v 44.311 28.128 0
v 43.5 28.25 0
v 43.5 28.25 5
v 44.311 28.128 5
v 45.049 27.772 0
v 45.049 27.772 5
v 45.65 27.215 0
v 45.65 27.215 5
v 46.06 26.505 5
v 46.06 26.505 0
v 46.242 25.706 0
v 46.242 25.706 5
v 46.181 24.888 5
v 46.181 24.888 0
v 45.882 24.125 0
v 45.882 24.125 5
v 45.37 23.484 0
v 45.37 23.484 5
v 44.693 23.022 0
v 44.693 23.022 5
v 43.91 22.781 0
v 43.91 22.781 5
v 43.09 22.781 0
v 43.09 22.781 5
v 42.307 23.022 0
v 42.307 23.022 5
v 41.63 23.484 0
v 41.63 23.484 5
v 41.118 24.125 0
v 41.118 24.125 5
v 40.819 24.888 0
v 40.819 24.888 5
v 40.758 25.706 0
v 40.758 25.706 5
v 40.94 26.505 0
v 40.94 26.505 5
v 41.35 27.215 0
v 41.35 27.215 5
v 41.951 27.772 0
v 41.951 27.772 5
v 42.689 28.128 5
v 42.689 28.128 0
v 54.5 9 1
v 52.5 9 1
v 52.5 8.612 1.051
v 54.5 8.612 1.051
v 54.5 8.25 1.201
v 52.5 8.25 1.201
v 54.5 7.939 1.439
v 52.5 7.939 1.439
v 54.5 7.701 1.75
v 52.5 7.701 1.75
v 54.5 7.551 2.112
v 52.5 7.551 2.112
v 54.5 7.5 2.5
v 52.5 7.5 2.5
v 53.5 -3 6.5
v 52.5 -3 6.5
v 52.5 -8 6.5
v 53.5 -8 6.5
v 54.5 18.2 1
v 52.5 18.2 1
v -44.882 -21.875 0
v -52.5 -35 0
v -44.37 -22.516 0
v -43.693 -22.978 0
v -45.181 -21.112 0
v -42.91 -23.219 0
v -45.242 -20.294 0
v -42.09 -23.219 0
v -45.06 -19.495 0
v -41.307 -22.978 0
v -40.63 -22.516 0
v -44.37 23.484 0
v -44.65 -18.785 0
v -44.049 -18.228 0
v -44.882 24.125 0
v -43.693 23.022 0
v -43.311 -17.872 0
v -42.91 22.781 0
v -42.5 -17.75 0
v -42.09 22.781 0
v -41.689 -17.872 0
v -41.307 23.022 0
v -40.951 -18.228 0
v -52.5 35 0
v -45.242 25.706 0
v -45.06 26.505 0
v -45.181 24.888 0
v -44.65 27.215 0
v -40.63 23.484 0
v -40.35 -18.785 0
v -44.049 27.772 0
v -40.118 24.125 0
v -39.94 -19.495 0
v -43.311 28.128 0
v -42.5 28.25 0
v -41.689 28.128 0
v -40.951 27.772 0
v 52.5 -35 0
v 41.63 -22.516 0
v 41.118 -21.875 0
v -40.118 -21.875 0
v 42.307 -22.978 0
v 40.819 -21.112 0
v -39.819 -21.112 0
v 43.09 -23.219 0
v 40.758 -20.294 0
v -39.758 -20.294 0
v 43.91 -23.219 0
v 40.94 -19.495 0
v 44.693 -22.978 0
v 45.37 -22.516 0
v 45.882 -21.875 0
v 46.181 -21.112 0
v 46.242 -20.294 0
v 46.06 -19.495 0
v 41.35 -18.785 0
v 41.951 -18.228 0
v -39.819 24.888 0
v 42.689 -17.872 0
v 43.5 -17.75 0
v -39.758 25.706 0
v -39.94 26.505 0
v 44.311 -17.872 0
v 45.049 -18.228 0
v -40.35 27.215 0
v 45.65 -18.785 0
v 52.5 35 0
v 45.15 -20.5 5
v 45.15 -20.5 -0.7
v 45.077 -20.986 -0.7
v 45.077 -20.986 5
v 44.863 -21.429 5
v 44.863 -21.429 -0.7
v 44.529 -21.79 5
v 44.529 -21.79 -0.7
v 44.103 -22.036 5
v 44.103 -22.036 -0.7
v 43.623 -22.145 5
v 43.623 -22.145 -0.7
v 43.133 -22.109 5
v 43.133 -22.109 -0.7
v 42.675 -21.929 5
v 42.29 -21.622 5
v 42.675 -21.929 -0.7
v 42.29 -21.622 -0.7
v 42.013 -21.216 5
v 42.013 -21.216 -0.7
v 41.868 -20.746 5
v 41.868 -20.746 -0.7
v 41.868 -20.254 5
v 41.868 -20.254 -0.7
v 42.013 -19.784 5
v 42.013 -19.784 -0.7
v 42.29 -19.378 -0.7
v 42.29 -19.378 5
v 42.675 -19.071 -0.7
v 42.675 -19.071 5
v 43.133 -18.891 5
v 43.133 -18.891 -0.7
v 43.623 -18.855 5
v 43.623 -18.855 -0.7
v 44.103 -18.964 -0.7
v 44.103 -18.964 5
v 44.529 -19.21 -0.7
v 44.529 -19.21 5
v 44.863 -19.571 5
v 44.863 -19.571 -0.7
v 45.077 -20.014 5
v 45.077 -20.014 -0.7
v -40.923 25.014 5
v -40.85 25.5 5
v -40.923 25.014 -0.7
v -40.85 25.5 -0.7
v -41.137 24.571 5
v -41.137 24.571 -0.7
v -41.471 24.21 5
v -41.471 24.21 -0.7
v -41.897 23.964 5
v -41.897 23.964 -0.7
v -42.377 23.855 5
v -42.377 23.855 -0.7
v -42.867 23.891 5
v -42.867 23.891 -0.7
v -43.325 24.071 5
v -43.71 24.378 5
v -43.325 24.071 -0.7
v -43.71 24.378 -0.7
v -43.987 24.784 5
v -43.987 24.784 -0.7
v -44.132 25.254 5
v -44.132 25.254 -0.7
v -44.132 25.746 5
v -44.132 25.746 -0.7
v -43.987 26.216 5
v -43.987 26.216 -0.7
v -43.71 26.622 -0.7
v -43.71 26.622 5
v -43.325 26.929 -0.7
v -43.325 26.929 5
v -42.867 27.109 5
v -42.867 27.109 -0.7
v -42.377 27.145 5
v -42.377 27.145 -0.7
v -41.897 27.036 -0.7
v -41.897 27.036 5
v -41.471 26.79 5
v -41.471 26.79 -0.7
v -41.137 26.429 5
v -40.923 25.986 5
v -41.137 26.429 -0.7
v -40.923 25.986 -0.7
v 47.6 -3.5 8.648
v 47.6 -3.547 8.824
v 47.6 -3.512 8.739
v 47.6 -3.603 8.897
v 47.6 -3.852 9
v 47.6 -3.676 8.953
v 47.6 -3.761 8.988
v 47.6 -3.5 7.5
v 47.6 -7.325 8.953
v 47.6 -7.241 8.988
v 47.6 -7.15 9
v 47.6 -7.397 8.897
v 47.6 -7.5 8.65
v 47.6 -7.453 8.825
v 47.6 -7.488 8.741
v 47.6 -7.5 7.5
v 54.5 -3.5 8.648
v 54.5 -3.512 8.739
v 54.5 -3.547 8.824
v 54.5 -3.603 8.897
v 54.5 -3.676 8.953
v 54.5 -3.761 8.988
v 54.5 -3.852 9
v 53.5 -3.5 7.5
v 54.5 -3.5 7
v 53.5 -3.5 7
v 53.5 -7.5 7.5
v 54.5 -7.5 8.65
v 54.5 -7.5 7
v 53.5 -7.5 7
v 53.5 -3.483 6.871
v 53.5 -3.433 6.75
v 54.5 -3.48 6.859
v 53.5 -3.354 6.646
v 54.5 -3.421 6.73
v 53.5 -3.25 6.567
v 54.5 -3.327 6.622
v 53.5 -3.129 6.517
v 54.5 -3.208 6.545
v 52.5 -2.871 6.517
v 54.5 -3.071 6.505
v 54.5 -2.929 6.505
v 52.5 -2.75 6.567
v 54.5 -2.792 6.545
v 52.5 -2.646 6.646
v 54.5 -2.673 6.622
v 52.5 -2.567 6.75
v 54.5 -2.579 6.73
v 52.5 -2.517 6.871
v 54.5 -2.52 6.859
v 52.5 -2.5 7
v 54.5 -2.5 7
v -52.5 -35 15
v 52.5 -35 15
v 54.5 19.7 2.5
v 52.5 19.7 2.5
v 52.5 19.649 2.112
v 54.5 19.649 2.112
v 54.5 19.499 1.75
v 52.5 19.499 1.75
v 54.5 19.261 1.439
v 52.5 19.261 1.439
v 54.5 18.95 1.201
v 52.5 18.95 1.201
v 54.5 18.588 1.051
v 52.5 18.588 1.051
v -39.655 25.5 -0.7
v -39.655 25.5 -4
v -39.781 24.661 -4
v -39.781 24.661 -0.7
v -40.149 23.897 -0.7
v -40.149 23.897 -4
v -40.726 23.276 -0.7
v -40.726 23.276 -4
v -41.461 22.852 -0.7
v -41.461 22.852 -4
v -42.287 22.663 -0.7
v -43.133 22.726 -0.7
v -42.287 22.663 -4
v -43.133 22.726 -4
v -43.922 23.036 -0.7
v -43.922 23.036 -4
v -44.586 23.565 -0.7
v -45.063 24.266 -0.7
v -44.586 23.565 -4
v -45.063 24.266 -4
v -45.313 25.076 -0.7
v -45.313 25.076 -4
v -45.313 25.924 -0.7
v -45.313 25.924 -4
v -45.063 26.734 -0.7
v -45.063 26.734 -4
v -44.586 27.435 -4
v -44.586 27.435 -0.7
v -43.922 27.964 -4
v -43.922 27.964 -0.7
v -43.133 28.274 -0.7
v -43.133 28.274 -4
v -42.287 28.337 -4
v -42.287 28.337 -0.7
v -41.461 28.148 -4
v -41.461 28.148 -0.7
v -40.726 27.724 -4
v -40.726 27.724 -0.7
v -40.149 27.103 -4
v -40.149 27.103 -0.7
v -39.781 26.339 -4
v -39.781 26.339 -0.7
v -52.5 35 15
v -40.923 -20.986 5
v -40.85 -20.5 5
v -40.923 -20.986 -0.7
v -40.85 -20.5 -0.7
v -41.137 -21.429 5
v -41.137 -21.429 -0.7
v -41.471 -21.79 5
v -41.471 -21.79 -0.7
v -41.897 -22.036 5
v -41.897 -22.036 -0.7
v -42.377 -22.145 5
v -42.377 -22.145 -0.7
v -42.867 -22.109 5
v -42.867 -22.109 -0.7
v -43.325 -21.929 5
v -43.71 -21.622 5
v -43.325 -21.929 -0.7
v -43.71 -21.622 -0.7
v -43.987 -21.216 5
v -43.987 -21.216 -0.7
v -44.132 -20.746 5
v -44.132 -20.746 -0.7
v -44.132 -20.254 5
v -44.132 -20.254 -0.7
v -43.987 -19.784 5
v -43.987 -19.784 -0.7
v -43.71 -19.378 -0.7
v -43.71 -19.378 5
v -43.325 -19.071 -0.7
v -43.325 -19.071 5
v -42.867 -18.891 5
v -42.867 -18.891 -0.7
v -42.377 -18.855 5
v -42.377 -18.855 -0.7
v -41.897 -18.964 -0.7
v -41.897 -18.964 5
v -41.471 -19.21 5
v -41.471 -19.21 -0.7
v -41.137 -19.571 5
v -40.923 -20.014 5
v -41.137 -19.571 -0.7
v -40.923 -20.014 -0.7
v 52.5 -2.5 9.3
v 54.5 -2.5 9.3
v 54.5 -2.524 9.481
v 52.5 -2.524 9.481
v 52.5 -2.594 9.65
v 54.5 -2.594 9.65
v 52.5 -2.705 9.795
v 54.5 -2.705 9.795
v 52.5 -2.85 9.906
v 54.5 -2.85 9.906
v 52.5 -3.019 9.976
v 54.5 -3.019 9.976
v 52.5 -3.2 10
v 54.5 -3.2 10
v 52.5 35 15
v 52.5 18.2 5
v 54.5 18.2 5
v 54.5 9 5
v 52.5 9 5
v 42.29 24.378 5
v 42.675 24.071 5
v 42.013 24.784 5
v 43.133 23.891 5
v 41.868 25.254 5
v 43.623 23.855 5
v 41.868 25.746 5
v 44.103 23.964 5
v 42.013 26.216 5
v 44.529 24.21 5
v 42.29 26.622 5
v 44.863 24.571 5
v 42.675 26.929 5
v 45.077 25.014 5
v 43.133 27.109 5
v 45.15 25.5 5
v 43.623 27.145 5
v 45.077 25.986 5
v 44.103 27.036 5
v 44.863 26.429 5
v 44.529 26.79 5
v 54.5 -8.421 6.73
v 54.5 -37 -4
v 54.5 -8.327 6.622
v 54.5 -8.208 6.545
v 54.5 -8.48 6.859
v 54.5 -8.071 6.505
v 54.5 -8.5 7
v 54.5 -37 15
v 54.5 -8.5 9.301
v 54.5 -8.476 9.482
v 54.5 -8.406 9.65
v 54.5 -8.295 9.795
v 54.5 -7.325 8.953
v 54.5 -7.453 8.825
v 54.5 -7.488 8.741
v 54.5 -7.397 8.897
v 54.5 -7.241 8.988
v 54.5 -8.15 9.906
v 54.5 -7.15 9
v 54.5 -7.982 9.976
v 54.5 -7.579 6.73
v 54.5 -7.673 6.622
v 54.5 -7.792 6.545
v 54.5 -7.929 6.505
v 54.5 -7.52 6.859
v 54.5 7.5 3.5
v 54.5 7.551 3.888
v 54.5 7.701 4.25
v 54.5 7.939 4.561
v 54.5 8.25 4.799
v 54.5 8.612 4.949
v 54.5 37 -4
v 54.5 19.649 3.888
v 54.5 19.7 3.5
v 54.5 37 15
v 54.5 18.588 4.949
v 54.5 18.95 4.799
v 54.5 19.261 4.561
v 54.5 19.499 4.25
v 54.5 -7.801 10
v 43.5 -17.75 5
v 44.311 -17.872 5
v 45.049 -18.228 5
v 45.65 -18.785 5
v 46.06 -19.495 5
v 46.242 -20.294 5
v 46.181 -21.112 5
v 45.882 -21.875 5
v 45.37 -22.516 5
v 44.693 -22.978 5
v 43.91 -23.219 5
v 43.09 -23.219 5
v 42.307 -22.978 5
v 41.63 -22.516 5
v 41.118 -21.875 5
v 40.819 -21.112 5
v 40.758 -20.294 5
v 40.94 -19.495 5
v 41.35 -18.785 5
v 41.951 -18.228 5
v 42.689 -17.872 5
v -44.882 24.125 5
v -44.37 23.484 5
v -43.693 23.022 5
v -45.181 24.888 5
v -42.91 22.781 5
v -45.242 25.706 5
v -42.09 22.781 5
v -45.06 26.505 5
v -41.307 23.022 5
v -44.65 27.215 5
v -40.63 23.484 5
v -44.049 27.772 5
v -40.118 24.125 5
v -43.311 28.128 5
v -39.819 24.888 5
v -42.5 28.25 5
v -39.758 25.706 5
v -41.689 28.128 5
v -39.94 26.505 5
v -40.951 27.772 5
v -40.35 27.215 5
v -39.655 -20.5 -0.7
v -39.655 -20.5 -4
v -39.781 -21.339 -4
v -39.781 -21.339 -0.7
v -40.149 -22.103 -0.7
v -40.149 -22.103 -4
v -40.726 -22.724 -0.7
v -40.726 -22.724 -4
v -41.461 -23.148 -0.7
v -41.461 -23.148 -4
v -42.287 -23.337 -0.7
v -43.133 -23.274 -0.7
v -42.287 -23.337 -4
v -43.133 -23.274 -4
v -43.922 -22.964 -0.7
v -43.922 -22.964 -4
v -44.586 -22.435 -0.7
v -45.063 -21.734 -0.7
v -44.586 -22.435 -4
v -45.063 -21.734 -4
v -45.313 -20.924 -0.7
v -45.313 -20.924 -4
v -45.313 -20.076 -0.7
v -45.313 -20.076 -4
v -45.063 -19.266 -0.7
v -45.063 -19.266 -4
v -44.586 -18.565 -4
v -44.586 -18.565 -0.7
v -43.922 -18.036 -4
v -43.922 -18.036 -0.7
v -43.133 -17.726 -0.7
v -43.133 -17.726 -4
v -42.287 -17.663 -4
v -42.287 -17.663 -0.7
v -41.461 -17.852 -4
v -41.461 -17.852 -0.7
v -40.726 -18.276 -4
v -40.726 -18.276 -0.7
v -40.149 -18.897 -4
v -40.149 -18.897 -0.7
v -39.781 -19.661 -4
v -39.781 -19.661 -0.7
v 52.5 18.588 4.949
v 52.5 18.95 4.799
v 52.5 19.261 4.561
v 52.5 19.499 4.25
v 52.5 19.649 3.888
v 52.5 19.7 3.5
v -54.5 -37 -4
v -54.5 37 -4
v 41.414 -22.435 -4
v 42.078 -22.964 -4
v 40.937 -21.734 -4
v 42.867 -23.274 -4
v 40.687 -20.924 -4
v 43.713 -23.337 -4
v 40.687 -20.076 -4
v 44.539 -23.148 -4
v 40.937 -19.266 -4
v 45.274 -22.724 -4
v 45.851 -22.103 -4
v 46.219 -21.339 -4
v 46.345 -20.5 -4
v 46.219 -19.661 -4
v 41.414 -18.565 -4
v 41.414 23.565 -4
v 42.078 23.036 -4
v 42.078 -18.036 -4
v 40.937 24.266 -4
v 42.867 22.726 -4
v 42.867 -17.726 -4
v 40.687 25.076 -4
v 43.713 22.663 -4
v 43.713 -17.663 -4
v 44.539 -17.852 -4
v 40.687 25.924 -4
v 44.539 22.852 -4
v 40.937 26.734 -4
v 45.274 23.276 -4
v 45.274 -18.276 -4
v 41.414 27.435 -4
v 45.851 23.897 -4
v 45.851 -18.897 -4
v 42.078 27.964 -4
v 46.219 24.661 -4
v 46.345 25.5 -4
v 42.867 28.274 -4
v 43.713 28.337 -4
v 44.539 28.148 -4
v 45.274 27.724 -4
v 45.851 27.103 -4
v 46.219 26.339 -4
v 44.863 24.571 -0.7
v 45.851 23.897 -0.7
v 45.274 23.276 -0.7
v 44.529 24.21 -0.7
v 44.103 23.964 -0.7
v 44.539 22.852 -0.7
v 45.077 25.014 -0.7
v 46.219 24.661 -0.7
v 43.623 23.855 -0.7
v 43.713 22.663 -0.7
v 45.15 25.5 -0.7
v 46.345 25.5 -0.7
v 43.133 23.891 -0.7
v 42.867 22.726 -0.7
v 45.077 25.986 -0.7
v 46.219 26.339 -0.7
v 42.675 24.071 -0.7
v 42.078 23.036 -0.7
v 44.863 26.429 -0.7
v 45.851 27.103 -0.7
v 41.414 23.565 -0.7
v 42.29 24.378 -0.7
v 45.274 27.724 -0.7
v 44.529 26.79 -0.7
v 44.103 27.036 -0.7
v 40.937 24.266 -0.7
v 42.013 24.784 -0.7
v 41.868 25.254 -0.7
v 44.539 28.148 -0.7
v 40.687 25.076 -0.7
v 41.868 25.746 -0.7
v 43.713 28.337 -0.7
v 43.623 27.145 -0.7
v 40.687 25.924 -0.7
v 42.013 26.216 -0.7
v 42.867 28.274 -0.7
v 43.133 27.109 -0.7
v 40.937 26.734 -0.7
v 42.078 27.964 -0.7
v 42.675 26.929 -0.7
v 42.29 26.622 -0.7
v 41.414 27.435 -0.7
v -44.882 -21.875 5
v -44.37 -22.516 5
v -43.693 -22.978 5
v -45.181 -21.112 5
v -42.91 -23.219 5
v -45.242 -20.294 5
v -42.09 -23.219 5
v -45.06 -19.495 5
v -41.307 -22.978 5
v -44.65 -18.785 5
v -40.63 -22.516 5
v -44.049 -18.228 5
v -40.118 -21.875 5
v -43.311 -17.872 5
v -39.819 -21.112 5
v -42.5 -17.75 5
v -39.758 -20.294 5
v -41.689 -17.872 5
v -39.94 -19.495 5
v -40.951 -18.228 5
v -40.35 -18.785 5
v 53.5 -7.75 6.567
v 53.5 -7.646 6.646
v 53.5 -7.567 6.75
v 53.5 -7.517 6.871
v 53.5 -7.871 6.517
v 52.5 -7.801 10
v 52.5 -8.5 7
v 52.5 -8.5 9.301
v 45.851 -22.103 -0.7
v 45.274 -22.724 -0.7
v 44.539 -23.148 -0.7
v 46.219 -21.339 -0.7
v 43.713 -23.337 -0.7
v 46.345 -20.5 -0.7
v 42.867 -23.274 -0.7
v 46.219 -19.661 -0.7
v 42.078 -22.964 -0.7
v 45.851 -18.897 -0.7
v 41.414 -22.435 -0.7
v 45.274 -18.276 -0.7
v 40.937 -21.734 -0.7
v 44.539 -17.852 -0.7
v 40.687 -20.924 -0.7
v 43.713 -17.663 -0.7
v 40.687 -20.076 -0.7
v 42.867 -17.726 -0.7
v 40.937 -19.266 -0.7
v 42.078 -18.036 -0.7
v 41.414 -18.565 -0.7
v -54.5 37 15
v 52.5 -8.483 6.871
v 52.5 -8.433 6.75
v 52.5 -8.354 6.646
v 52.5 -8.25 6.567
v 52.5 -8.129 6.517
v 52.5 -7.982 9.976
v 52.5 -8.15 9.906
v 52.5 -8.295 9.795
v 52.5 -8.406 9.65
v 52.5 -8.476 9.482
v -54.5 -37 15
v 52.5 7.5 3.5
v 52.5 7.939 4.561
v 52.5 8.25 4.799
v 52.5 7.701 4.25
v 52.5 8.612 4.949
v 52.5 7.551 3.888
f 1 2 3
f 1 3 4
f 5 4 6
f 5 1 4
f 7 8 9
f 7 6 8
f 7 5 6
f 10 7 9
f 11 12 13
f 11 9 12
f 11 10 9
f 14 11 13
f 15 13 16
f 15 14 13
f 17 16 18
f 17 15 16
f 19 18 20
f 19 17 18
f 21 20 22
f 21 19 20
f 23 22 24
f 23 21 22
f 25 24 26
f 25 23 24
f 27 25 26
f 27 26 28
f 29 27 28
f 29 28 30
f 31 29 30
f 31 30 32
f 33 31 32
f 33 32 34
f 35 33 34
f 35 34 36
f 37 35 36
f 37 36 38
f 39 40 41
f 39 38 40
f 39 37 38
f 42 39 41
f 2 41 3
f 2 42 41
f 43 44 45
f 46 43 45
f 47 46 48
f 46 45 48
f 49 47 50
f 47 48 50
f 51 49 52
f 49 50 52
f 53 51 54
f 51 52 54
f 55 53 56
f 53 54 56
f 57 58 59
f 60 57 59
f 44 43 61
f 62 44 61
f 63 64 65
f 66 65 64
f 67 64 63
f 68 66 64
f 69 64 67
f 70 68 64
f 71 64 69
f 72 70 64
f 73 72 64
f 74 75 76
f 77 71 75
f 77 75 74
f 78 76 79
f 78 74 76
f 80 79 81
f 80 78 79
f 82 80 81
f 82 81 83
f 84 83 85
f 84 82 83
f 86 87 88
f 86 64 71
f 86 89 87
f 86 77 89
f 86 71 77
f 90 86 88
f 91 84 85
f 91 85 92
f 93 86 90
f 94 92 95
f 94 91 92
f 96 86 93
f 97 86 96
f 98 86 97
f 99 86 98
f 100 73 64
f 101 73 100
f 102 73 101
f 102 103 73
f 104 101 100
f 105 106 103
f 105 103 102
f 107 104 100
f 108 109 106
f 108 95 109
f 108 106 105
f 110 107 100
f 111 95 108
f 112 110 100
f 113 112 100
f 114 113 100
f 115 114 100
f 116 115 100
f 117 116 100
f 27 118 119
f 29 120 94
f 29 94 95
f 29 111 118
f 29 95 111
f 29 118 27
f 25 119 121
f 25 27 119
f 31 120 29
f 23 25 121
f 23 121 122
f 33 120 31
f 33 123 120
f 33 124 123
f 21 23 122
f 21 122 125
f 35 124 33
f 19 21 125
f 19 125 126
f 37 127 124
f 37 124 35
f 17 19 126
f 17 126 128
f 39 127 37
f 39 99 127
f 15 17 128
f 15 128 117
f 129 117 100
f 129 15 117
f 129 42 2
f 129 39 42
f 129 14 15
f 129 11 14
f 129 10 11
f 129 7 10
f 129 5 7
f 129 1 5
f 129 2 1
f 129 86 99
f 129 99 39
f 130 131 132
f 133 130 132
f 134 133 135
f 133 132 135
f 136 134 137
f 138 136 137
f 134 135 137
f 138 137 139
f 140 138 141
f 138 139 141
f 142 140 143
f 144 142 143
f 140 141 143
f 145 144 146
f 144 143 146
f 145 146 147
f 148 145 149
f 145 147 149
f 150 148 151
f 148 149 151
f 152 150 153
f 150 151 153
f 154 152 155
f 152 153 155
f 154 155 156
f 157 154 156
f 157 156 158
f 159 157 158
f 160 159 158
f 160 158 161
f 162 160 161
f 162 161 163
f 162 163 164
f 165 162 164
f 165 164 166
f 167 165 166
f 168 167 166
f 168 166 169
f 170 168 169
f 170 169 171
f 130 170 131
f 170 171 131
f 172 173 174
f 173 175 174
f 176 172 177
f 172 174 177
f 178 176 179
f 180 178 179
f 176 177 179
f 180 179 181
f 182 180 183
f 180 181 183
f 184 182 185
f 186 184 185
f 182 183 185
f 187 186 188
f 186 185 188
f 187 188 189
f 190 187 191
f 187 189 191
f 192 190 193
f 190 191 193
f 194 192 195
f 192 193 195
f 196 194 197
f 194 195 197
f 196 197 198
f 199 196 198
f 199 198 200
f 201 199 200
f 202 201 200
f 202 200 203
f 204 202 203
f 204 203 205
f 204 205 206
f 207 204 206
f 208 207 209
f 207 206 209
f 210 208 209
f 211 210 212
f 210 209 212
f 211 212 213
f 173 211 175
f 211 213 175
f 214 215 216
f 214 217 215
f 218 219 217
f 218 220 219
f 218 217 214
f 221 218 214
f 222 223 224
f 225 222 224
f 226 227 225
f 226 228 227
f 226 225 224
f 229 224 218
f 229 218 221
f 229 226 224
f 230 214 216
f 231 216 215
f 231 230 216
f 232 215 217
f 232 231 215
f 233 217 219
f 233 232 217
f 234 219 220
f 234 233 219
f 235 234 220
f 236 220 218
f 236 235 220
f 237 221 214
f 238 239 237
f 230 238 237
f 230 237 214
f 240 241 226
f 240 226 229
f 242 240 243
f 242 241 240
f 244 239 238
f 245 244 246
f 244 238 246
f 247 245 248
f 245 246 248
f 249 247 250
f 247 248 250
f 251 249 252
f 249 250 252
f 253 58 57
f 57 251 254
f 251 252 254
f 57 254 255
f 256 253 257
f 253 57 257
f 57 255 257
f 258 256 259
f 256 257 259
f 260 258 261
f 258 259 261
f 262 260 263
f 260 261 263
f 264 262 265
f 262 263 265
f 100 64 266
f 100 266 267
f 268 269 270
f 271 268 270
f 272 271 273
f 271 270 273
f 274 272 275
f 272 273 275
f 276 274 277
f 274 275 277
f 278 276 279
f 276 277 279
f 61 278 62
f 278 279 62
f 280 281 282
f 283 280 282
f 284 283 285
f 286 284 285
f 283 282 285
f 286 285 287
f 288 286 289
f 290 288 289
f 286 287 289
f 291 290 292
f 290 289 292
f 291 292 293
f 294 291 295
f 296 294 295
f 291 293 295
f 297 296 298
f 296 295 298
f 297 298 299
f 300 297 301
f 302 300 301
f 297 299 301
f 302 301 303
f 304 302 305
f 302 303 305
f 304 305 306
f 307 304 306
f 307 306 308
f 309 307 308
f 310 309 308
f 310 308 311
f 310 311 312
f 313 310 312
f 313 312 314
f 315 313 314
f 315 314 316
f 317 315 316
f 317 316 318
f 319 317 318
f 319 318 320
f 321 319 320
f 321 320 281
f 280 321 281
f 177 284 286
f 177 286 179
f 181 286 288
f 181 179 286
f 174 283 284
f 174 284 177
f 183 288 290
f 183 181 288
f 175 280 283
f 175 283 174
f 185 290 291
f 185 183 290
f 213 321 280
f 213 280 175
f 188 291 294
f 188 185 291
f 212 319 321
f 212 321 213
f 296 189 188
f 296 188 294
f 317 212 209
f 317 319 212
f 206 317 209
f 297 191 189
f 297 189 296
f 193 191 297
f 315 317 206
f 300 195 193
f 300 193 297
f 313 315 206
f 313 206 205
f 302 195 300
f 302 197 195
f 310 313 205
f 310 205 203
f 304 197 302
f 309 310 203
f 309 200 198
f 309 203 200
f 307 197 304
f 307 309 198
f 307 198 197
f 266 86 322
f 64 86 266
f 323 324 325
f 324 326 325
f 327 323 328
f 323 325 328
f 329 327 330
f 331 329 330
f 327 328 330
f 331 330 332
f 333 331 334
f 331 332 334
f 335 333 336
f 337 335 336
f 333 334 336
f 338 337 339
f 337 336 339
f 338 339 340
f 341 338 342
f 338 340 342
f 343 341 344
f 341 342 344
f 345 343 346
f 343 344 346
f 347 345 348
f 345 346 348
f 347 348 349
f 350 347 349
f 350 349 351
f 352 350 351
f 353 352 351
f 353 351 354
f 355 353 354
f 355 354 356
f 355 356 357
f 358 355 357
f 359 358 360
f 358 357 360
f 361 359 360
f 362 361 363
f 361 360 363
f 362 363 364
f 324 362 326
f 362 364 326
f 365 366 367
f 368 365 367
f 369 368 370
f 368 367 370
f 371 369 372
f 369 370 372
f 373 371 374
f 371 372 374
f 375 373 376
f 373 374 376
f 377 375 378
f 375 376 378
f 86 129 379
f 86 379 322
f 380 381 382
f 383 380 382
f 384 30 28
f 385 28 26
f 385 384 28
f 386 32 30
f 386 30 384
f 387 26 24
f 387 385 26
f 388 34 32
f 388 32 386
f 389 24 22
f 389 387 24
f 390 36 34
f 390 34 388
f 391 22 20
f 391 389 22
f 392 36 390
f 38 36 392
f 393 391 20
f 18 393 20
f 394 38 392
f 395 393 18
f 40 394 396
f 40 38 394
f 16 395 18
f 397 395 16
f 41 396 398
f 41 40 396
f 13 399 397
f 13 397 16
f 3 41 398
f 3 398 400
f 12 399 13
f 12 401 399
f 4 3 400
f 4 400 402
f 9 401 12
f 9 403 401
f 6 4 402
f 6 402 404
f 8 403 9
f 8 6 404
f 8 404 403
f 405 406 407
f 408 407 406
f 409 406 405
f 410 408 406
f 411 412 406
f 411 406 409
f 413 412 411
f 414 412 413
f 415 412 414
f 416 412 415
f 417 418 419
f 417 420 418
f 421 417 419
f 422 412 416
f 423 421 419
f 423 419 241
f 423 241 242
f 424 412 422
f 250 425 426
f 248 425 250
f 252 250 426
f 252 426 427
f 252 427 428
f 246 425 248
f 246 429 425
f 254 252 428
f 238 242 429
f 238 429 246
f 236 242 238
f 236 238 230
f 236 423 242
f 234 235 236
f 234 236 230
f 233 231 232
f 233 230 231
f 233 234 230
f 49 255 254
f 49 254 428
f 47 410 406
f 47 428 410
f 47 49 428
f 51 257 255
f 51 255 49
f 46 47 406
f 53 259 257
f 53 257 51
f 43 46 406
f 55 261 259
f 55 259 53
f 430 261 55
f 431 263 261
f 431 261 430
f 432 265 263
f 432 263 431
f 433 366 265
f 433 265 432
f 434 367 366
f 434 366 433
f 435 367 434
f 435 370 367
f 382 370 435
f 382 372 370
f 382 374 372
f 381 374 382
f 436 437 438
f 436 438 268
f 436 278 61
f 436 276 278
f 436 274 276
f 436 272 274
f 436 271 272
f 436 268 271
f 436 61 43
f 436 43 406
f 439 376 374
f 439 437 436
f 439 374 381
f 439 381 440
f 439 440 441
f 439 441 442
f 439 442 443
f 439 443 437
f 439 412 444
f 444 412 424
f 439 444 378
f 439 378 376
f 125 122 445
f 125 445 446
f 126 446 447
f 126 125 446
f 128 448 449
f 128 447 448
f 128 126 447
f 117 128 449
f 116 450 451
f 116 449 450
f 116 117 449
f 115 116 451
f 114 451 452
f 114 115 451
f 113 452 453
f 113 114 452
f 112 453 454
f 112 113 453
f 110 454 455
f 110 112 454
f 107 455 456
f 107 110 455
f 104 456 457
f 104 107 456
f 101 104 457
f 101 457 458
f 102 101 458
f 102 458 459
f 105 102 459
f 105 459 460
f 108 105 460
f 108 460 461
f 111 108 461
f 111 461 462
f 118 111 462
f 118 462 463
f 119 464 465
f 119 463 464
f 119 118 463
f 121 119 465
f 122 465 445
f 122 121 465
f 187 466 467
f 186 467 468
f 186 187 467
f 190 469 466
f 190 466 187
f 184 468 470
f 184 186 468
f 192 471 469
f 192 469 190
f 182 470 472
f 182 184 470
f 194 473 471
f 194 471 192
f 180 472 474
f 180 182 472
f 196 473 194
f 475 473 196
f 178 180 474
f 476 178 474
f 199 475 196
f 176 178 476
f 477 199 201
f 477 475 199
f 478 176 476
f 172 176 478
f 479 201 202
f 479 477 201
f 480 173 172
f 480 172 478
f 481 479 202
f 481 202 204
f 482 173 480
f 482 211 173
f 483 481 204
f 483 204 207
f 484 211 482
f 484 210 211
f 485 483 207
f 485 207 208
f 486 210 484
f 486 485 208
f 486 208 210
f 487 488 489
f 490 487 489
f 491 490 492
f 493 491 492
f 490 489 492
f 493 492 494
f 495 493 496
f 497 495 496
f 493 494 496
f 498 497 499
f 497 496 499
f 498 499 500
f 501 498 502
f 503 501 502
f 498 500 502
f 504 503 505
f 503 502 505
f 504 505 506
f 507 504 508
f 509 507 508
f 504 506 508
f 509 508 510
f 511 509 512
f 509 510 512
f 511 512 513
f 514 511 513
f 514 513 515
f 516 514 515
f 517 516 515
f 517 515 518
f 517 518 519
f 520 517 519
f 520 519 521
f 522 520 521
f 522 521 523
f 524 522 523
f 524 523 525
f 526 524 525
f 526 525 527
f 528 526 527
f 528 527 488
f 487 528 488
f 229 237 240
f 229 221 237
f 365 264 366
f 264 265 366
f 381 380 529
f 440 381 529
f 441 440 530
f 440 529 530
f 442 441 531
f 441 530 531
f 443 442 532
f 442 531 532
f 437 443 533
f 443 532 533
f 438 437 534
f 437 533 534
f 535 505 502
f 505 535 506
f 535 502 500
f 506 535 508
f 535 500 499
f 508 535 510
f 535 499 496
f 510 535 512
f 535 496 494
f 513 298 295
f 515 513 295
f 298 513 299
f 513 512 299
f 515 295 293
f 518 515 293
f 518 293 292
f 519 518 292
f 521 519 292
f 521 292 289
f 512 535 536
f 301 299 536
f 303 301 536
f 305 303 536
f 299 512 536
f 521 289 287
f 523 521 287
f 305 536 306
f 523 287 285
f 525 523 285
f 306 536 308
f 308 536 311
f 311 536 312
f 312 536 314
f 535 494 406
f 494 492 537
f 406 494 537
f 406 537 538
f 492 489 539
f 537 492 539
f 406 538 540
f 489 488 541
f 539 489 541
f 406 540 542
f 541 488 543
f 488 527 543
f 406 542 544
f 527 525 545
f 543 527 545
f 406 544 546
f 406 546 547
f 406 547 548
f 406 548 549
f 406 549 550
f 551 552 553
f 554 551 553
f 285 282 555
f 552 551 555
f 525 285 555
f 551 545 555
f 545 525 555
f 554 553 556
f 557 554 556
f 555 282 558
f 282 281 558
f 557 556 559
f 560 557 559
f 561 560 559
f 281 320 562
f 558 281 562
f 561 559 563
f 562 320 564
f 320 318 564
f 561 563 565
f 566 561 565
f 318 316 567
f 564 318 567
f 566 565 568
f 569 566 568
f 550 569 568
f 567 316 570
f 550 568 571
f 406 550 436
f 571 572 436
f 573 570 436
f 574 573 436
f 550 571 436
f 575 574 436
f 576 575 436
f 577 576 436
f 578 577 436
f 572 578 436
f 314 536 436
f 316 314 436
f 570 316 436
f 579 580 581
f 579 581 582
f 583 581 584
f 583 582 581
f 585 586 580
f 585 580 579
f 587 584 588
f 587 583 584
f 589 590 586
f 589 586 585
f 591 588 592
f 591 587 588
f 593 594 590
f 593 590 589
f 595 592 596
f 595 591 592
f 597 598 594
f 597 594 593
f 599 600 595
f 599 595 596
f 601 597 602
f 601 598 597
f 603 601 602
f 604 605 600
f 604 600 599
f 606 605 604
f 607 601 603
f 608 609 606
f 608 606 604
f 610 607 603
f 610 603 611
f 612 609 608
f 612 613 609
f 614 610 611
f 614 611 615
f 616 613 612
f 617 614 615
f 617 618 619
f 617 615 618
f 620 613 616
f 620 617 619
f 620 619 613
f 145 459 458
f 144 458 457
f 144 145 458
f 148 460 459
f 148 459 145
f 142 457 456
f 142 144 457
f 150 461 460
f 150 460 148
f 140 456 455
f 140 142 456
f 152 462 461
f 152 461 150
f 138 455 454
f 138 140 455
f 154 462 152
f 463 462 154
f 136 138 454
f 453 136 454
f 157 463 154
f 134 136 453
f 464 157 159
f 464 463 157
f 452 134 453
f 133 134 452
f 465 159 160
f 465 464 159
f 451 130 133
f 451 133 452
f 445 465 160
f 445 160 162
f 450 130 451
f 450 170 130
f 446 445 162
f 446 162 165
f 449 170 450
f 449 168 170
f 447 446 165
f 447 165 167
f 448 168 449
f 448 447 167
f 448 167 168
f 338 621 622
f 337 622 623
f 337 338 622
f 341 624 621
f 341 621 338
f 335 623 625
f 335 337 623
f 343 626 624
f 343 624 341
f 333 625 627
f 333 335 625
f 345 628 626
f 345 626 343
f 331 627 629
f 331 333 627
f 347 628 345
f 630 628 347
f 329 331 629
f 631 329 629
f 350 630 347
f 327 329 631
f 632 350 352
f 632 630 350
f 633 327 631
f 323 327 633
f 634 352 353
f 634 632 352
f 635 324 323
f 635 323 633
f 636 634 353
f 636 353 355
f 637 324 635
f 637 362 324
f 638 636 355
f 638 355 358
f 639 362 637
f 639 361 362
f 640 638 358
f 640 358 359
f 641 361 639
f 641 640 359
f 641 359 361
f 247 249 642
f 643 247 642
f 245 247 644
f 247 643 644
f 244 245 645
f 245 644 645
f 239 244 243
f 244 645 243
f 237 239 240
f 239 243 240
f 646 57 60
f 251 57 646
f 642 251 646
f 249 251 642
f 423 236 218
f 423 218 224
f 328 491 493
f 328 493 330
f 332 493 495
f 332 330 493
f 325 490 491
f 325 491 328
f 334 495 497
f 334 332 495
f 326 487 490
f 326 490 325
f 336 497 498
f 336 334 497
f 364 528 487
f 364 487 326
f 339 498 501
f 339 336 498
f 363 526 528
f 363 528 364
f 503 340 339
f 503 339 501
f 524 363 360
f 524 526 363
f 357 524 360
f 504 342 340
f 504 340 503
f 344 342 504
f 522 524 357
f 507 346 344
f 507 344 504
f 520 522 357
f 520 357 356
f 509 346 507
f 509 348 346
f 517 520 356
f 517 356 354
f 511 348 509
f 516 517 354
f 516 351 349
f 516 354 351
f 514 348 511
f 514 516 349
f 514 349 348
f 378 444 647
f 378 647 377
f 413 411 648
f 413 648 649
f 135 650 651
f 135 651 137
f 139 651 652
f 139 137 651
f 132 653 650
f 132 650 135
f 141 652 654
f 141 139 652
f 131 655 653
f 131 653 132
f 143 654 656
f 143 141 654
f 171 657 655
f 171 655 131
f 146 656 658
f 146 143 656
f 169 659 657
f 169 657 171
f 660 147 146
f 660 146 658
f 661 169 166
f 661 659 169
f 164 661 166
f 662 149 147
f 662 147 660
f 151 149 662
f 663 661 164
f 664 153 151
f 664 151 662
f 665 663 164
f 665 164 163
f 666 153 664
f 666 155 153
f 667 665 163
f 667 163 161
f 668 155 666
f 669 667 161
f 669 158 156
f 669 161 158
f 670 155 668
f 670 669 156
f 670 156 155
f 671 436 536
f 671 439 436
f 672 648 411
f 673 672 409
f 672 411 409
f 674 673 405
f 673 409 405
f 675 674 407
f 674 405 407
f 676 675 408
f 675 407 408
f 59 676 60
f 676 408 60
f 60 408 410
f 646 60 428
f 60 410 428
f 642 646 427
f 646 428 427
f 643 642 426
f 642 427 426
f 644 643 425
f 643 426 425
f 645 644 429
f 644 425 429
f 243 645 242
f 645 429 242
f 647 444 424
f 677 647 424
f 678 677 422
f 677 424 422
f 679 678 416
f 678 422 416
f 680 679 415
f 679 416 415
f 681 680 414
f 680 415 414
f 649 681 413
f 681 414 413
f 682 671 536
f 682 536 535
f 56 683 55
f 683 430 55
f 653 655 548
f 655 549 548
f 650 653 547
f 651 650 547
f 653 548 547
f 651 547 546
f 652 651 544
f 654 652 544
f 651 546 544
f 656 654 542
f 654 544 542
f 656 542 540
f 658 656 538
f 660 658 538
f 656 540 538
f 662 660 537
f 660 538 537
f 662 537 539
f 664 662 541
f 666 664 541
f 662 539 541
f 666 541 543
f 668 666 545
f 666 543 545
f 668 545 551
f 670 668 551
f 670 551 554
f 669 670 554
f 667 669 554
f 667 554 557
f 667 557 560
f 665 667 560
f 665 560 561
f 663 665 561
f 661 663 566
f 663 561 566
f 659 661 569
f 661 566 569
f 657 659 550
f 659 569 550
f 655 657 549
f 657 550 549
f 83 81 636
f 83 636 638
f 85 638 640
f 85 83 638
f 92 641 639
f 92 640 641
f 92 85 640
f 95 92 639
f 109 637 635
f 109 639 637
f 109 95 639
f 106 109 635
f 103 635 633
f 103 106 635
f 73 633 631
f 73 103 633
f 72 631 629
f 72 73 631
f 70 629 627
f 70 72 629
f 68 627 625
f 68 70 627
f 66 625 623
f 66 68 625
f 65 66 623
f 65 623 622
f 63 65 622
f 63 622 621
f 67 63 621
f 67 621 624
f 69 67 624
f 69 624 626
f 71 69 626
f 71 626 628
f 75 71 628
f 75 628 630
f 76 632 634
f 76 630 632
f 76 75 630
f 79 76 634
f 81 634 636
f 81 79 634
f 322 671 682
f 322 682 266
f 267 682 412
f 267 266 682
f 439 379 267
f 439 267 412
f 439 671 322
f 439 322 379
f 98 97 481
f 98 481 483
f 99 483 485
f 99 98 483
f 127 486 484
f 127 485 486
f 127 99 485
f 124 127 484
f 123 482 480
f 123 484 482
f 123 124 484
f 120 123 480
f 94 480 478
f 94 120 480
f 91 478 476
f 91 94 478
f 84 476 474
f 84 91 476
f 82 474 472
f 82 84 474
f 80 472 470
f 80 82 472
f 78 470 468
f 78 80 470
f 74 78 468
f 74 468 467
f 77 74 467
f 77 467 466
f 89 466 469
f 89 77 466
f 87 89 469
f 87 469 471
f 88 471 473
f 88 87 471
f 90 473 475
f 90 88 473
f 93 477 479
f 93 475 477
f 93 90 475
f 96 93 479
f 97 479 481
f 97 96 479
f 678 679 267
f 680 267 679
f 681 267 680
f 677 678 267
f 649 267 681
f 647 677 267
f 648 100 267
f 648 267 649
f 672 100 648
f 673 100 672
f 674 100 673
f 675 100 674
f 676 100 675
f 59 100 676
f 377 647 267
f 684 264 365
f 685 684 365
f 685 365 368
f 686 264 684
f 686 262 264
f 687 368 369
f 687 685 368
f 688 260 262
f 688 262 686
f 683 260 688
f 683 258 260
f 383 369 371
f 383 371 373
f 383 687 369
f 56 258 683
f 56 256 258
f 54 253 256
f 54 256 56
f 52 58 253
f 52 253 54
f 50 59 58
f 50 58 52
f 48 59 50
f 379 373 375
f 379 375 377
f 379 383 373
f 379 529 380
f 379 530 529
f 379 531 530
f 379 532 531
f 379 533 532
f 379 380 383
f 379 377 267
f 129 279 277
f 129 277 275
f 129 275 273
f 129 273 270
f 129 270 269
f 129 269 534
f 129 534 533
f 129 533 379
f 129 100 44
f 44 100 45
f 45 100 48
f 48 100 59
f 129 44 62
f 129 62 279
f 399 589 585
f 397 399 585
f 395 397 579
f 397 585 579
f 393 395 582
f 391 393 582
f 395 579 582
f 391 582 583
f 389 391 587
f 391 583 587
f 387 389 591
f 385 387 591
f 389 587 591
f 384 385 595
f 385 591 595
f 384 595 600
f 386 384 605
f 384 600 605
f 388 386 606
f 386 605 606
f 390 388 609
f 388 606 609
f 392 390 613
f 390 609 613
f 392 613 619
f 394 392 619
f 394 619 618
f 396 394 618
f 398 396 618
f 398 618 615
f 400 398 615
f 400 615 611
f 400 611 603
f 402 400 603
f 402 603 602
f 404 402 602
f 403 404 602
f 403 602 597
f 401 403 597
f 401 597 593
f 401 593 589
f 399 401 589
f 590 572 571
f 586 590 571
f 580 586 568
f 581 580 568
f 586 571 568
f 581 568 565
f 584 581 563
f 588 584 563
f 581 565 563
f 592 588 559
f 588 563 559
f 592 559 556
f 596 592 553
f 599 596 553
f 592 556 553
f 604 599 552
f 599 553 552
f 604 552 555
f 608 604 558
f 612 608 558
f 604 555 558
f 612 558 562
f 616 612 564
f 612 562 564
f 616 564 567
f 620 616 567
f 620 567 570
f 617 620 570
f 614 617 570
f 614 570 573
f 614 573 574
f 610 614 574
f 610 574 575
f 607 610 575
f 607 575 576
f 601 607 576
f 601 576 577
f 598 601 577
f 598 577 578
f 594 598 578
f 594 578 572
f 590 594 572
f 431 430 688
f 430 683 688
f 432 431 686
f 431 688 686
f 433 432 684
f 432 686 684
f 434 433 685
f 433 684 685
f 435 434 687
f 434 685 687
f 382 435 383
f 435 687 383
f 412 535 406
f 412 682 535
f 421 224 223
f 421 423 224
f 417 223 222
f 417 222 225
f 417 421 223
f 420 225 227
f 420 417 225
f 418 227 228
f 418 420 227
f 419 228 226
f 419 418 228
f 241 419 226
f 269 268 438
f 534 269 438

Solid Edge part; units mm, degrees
sketch "Sketch1" plane through (0, 0, 0) normal (0, 0, 1) x (1, 0, 0)
  line L0 (-54.5, -37) -> (54.5, -37)
  line L1 (54.5, -37) -> (54.5, 37)
  line L2 (54.5, 37) -> (-54.5, 37)
  line L3 (-54.5, 37) -> (-54.5, -37)
extrude "Protrusion1" add sketch "Sketch1" against normal blind 4
sketch "Sketch2" plane through (0, 0, 0) normal (0, 0, 1) x (1, 0, 0)
  line L0 (-54.5, 37) -> (-54.5, -37)
  line L1 (-54.5, -37) -> (54.5, -37)
  line L2 (54.5, -37) -> (54.5, 37)
  line L3 (54.5, 37) -> (-54.5, 37)
  line L4 (-52.5, 35) -> (-52.5, -35)
  line L5 (-52.5, -35) -> (52.5, -35)
  line L6 (52.5, -35) -> (52.5, 35)
  line L7 (52.5, 35) -> (-52.5, 35)
  dimension "D1" = 105
  dimension "D2" = 70
  dimension "D3" = 2
  dimension "D4" = 5.69
  dimension "D5" = 5.69
  dimension "D6" = 5.69
  dimension "D7" = 5.69
  dimension "D8" = 10
  dimension "D9" = 86
  dimension "D10" = 9.5
  dimension "D11" = 46
  dimension "D12" = 14.5
extrude "ExtrudedProtrusion_2" add sketch "Sketch2" along normal blind 15
sketch "Sketch3" plane through (54.5, 0, 5.5) normal (1, 0, 0) x (0, 1, 0)
  arc A0 (-2.5, 3.8) -> (-3.2, 4.5) centre (-3.2, 3.8) ccw
  line L0 (-7.8008, 4.5) -> (-3.2, 4.5)
  arc A1 (-7.8008, 4.5) -> (-8.5, 3.8008) centre (-7.8008, 3.8008) ccw
  line L1 (-8.5, 1.5) -> (-8.5, 3.8008)
  line L2 (-7.5, 3.15) -> (-7.5, 1.5)
  arc A2 (-7.5, 3.15) -> (-7.15, 3.5) centre (-7.15, 3.15) cw
  line L3 (-3.8523, 3.5) -> (-7.15, 3.5)
  arc A3 (-3.8523, 3.5) -> (-3.5, 3.1477) centre (-3.8523, 3.1477) cw
  line L4 (-3.5, 1.5) -> (-3.5, 3.1477)
  line L5 (-2.5, 1.5) -> (-2.5, 3.8)
  arc A4 (-7.5, 1.5) -> (-8.5, 1.5) centre (-8, 1.5) cw
  arc A5 (-2.5, 1.5) -> (-3.5, 1.5) centre (-3, 1.5) cw
extrude "Cutout1" cut sketch "Sketch3" against normal blind 6.7422
sketch "Sketch4" plane through (0, 0, -4) normal (0, 0, -1) x (1, 0, 0)
  circle A0 centre (-42.5, 20.5) radius 2.845
  circle A1 centre (43.5, 20.5) radius 2.845
  circle A2 centre (43.5, -25.5) radius 2.845
  circle A3 centre (-42.5, -25.5) radius 2.845
  dimension "D1" = 3.3
  dimension "D2" = 3.3
  dimension "D3" = 3.3
  dimension "D4" = 3.3
  dimension "D5" = 5.69
  dimension "D6" = 5.69
  dimension "D7" = 5.69
  dimension "D8" = 5.69
extrude "ExtrudedCutout_11" cut sketch "Sketch4" against normal blind 3.3
sketch "Sketch5" plane through (0, 0, 0) normal (0, 0, 1) x (0, 1, 0)
  circle A0 centre (25.5, -43.5) radius 2.75
  circle A1 centre (25.5, 42.5) radius 2.75
  circle A2 centre (-20.5, 42.5) radius 2.75
  circle A3 centre (-20.5, -43.5) radius 2.75
extrude "ExtrudedProtrusion_15" add sketch "Sketch5" along normal blind 5
sketch "Sketch6" plane through (0, 0, -4) normal (0, 0, -1) x (1, 0, 0)
  circle A0 centre (-42.5, -25.5) radius 1.65
  circle A1 centre (-42.5, 20.5) radius 1.65
  circle A2 centre (43.5, -25.5) radius 1.65
  circle A3 centre (43.5, 20.5) radius 1.65
  dimension "D1" = 3.3
  dimension "D2" = 3.3
  dimension "D3" = 3.3
  dimension "D4" = 3.3
  dimension "D5" = 5.69
  dimension "D6" = 5.69
  dimension "D7" = 5.69
  dimension "D8" = 5.69
extrude "ExtrudedCutout_13" cut sketch "Sketch6" against normal blind 19.0818
sketch "Sketch7" plane through (54.5, 0, 5.5) normal (1, 0, 0) x (0, 1, 0)
  line L0 (19.7, -0.5) -> (7.5, -0.5)
  line L1 (7.5, -0.5) -> (7.5, -4.5)
  line L2 (7.5, -4.5) -> (19.7, -4.5)
  line L3 (19.7, -4.5) -> (19.7, -0.5)
extrude "Cutout2" cut sketch "Sketch7" against normal up to next
fillet "Round_5" radius 1.5 4 edges at (53.5, 19.7, 5) (53.5, 19.7, 1) (53.5, 7.5, 1) (53.5, 7.5, 5)
sketch "Sketch8" plane through (52.5, 0, 7.5) normal (-1, 0, 0) x (0, -1, 0)
  line L0 (3.5, 0) -> (7.5, 0)
  line L1 (7.5, 0) -> (7.5, -0.5)
  arc A0 (7.5, -0.5) -> (8, -1) centre (8, -0.5) ccw
  line L2 (3, -1) -> (8, -1)
  arc A1 (3.5, -0.5) -> (3, -1) centre (3, -0.5) cw
  line L3 (3.5, -0.5) -> (3.5, 0)
extrude "ExtrudedCutout_15" cut sketch "Sketch8" against normal blind 1
sketch "Sketch9" plane through (52.5, -5.5, 8.25) normal (-1, 0, 0) x (0, -1, 0)
  line L0 (2, -0.75) -> (2, 0.4)
  line L1 (-2, -0.75) -> (2, -0.75)
  line L2 (-2, 0.3977) -> (-2, -0.75)
  line L3 (-1.6477, 0.75) -> (1.65, 0.75)
  arc A0 (1.65, 0.75) -> (2, 0.4) centre (1.65, 0.4) cw
  arc A1 (-2, 0.3977) -> (-1.6477, 0.75) centre (-1.6477, 0.3977) cw
extrude "ExtrudedProtrusion_16" add sketch "Sketch9" along normal blind 4.9
